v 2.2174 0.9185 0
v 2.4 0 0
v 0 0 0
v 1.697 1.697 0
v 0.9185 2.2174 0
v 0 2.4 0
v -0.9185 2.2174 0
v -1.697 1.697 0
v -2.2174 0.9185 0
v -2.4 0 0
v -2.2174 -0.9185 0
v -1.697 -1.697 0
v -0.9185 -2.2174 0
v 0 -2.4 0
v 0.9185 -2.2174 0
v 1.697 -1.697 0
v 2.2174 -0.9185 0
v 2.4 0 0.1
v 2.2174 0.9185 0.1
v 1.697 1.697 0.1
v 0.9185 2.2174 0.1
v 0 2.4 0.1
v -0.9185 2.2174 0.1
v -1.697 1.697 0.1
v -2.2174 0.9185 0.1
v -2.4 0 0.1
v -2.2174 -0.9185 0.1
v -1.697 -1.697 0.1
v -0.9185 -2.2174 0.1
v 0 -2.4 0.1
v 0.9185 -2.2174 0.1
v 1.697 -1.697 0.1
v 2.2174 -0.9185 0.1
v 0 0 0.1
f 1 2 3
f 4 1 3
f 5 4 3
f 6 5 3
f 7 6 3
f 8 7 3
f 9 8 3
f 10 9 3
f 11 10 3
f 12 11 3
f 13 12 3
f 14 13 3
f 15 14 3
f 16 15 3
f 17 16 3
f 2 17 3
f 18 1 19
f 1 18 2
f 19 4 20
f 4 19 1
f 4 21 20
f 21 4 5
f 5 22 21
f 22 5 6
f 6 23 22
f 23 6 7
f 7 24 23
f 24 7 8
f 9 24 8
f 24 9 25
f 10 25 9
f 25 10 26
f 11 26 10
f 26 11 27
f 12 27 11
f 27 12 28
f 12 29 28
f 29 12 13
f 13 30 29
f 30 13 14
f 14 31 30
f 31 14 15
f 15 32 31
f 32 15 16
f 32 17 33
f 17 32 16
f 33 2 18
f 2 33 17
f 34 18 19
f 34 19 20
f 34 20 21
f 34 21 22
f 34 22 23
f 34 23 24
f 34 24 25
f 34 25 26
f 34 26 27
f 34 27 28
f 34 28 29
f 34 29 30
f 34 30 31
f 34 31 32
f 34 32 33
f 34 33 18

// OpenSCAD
// file: ../p/4-4cyli.scad
use <../lib.scad>
function ldraw_lib__4_4cyli() = [
// 0 Cylinder 1.0
// 0 Name: 4-4cyli.dat
// 0 Author: James Jessiman
// 0 !LDRAW_ORG Primitive UPDATE 2005-01
// 0 !LICENSE Licensed under CC BY 4.0 : see CAreadme.txt
// 
// 0 BFC CERTIFY CCW
  [0,"BFC","CERTIFY"],
  [0,"BFC","CCW"],
// 
// 0 !HISTORY 1998-12-15 [PTadmin] Official Update 1998-10
// 0 !HISTORY 2002-03-23 [sbliss] Added BFC statement; merged headers from files in distributions LDraw 0.27 and Complete.
// 0 !HISTORY 2002-04-25 [PTadmin] Official Update 2002-02
// 0 !HISTORY 2004-12-14 [guyvivan] BFC CCW
// 0 !HISTORY 2005-12-28 [PTadmin] Official Update 2005-01
// 0 !HISTORY 2007-06-24 [PTadmin] Header formatted for Contributor Agreement
// 0 !HISTORY 2008-07-01 [PTadmin] Official Update 2008-01
// 
// 
// 4 16 1 1 0 0.9239 1 0.3827 0.9239 0 0.3827 1 0 0
  [4,16,1,1,0,0.9239,1,0.3827,0.9239,0,0.3827,1,0,0],
// 5 24 1 0 0 1 1 0 0.9239 0 0.3827 0.9239 0 -0.3827
  [5,24,1,0,0,1,1,0,0.9239,0,0.3827,0.9239,0,-0.3827],
// 4 16 0.9239 1 0.3827 0.7071 1 0.7071 0.7071 0 0.7071 0.9239 0 0.3827
  [4,16,0.9239,1,0.3827,0.7071,1,0.7071,0.7071,0,0.7071,0.9239,0,0.3827],
// 5 24 0.9239 0 0.3827 0.9239 1 0.3827 0.7071 0 0.7071 1 0 0
  [5,24,0.9239,0,0.3827,0.9239,1,0.3827,0.7071,0,0.7071,1,0,0],
// 4 16 0.7071 1 0.7071 0.3827 1 0.9239 0.3827 0 0.9239 0.7071 0 0.7071
  [4,16,0.7071,1,0.7071,0.3827,1,0.9239,0.3827,0,0.9239,0.7071,0,0.7071],
// 5 24 0.7071 0 0.7071 0.7071 1 0.7071 0.3827 0 0.9239 0.9239 0 0.3827
  [5,24,0.7071,0,0.7071,0.7071,1,0.7071,0.3827,0,0.9239,0.9239,0,0.3827],
// 4 16 0.3827 1 0.9239 0 1 1 0 0 1 0.3827 0 0.9239
  [4,16,0.3827,1,0.9239,0,1,1,0,0,1,0.3827,0,0.9239],
// 5 24 0.3827 0 0.9239 0.3827 1 0.9239 0 0 1 0.7071 0 0.7071
  [5,24,0.3827,0,0.9239,0.3827,1,0.9239,0,0,1,0.7071,0,0.7071],
// 4 16 0 1 1 -0.3827 1 0.9239 -0.3827 0 0.9239 0 0 1
  [4,16,0,1,1,-0.3827,1,0.9239,-0.3827,0,0.9239,0,0,1],
// 5 24 0 0 1 0 1 1 -0.3827 0 0.9239 0.3827 0 0.9239
  [5,24,0,0,1,0,1,1,-0.3827,0,0.9239,0.3827,0,0.9239],
// 4 16 -0.3827 1 0.9239 -0.7071 1 0.7071 -0.7071 0 0.7071 -0.3827 0 0.9239
  [4,16,-0.3827,1,0.9239,-0.7071,1,0.7071,-0.7071,0,0.7071,-0.3827,0,0.9239],
// 5 24 -0.3827 0 0.9239 -0.3827 1 0.9239 -0.7071 0 0.7071 0 0 1
  [5,24,-0.3827,0,0.9239,-0.3827,1,0.9239,-0.7071,0,0.7071,0,0,1],
// 4 16 -0.7071 1 0.7071 -0.9239 1 0.3827 -0.9239 0 0.3827 -0.7071 0 0.7071
  [4,16,-0.7071,1,0.7071,-0.9239,1,0.3827,-0.9239,0,0.3827,-0.7071,0,0.7071],
// 5 24 -0.7071 0 0.7071 -0.7071 1 0.7071 -0.9239 0 0.3827 -0.3827 0 0.9239
  [5,24,-0.7071,0,0.7071,-0.7071,1,0.7071,-0.9239,0,0.3827,-0.3827,0,0.9239],
// 4 16 -0.9239 1 0.3827 -1 1 0 -1 0 0 -0.9239 0 0.3827
  [4,16,-0.9239,1,0.3827,-1,1,0,-1,0,0,-0.9239,0,0.3827],
// 5 24 -0.9239 0 0.3827 -0.9239 1 0.3827 -1 0 0 -0.7071 0 0.7071
  [5,24,-0.9239,0,0.3827,-0.9239,1,0.3827,-1,0,0,-0.7071,0,0.7071],
// 4 16 -1 1 0 -0.9239 1 -0.3827 -0.9239 0 -0.3827 -1 0 0
  [4,16,-1,1,0,-0.9239,1,-0.3827,-0.9239,0,-0.3827,-1,0,0],
// 5 24 -1 0 0 -1 1 0 -0.9239 0 -0.3827 -0.9239 0 0.3827
  [5,24,-1,0,0,-1,1,0,-0.9239,0,-0.3827,-0.9239,0,0.3827],
// 4 16 -0.9239 1 -0.3827 -0.7071 1 -0.7071 -0.7071 0 -0.7071 -0.9239 0 -0.3827
  [4,16,-0.9239,1,-0.3827,-0.7071,1,-0.7071,-0.7071,0,-0.7071,-0.9239,0,-0.3827],
// 5 24 -0.9239 0 -0.3827 -0.9239 1 -0.3827 -0.7071 0 -0.7071 -1 0 0
  [5,24,-0.9239,0,-0.3827,-0.9239,1,-0.3827,-0.7071,0,-0.7071,-1,0,0],
// 4 16 -0.7071 1 -0.7071 -0.3827 1 -0.9239 -0.3827 0 -0.9239 -0.7071 0 -0.7071
  [4,16,-0.7071,1,-0.7071,-0.3827,1,-0.9239,-0.3827,0,-0.9239,-0.7071,0,-0.7071],
// 5 24 -0.7071 0 -0.7071 -0.7071 1 -0.7071 -0.3827 0 -0.9239 -0.9239 0 -0.3827
  [5,24,-0.7071,0,-0.7071,-0.7071,1,-0.7071,-0.3827,0,-0.9239,-0.9239,0,-0.3827],
// 4 16 -0.3827 1 -0.9239 0 1 -1 0 0 -1 -0.3827 0 -0.9239
  [4,16,-0.3827,1,-0.9239,0,1,-1,0,0,-1,-0.3827,0,-0.9239],
// 5 24 -0.3827 0 -0.9239 -0.3827 1 -0.9239 0 0 -1 -0.7071 0 -0.7071
  [5,24,-0.3827,0,-0.9239,-0.3827,1,-0.9239,0,0,-1,-0.7071,0,-0.7071],
// 4 16 0 1 -1 0.3827 1 -0.9239 0.3827 0 -0.9239 0 0 -1
  [4,16,0,1,-1,0.3827,1,-0.9239,0.3827,0,-0.9239,0,0,-1],
// 5 24 0 0 -1 0 1 -1 0.3827 0 -0.9239 -0.3827 0 -0.9239
  [5,24,0,0,-1,0,1,-1,0.3827,0,-0.9239,-0.3827,0,-0.9239],
// 4 16 0.3827 1 -0.9239 0.7071 1 -0.7071 0.7071 0 -0.7071 0.3827 0 -0.9239
  [4,16,0.3827,1,-0.9239,0.7071,1,-0.7071,0.7071,0,-0.7071,0.3827,0,-0.9239],
// 5 24 0.3827 0 -0.9239 0.3827 1 -0.9239 0.7071 0 -0.7071 0 0 -1
  [5,24,0.3827,0,-0.9239,0.3827,1,-0.9239,0.7071,0,-0.7071,0,0,-1],
// 4 16 0.7071 1 -0.7071 0.9239 1 -0.3827 0.9239 0 -0.3827 0.7071 0 -0.7071
  [4,16,0.7071,1,-0.7071,0.9239,1,-0.3827,0.9239,0,-0.3827,0.7071,0,-0.7071],
// 5 24 0.7071 0 -0.7071 0.7071 1 -0.7071 0.9239 0 -0.3827 0.3827 0 -0.9239
  [5,24,0.7071,0,-0.7071,0.7071,1,-0.7071,0.9239,0,-0.3827,0.3827,0,-0.9239],
// 4 16 0.9239 1 -0.3827 1 1 0 1 0 0 0.9239 0 -0.3827
  [4,16,0.9239,1,-0.3827,1,1,0,1,0,0,0.9239,0,-0.3827],
// 5 24 0.9239 0 -0.3827 0.9239 1 -0.3827 1 0 0 0.7071 0 -0.7071
  [5,24,0.9239,0,-0.3827,0.9239,1,-0.3827,1,0,0,0.7071,0,-0.7071],
// 0
];
module ldraw_lib__4_4cyli(step=0, col=false, unit=2/5, alt=false, line=0.2, solid=!$preview)
    makepoly(ldraw_lib__4_4cyli(), step=step, col=col, unit=unit, alt=alt, line=line, solid=solid);
ldraw_lib__4_4cyli(line=0.2);
// file: ../p/4-4disc.scad
use <../lib.scad>
function ldraw_lib__4_4disc() = [
// 0 Disc 1.0
// 0 Name: 4-4disc.dat
// 0 Author: James Jessiman
// 0 !LDRAW_ORG Primitive UPDATE 2002-02
// 0 !LICENSE Licensed under CC BY 4.0 : see CAreadme.txt
// 
// 0 BFC CERTIFY CCW
  [0,"BFC","CERTIFY"],
  [0,"BFC","CCW"],
// 
// 0 !HISTORY 1998-12-15 [PTadmin] Official Update 1998-10
// 0 !HISTORY 2002-03-23 [sbliss] Added BFC statement
// 0 !HISTORY 2002-04-25 [PTadmin] Official Update 2002-02
// 0 !HISTORY 2007-06-24 [PTadmin] Header formatted for Contributor Agreement
// 0 !HISTORY 2008-07-01 [PTadmin] Official Update 2008-01
// 
// 
// 3 16 0 0 0 1 0 0 0.9239 0 0.3827
  [3,16,0,0,0,1,0,0,0.9239,0,0.3827],
// 3 16 0 0 0 0.9239 0 0.3827 0.7071 0 0.7071
  [3,16,0,0,0,0.9239,0,0.3827,0.7071,0,0.7071],
// 3 16 0 0 0 0.7071 0 0.7071 0.3827 0 0.9239
  [3,16,0,0,0,0.7071,0,0.7071,0.3827,0,0.9239],
// 3 16 0 0 0 0.3827 0 0.9239 0 0 1
  [3,16,0,0,0,0.3827,0,0.9239,0,0,1],
// 3 16 0 0 0 0 0 1 -0.3827 0 0.9239
  [3,16,0,0,0,0,0,1,-0.3827,0,0.9239],
// 3 16 0 0 0 -0.3827 0 0.9239 -0.7071 0 0.7071
  [3,16,0,0,0,-0.3827,0,0.9239,-0.7071,0,0.7071],
// 3 16 0 0 0 -0.7071 0 0.7071 -0.9239 0 0.3827
  [3,16,0,0,0,-0.7071,0,0.7071,-0.9239,0,0.3827],
// 3 16 0 0 0 -0.9239 0 0.3827 -1 0 -0
  [3,16,0,0,0,-0.9239,0,0.3827,-1,0,-0],
// 3 16 0 0 0 -1 0 -0 -0.9239 0 -0.3827
  [3,16,0,0,0,-1,0,-0,-0.9239,0,-0.3827],
// 3 16 0 0 0 -0.9239 0 -0.3827 -0.7071 0 -0.7071
  [3,16,0,0,0,-0.9239,0,-0.3827,-0.7071,0,-0.7071],
// 3 16 0 0 0 -0.7071 0 -0.7071 -0.3827 0 -0.9239
  [3,16,0,0,0,-0.7071,0,-0.7071,-0.3827,0,-0.9239],
// 3 16 0 0 0 -0.3827 0 -0.9239 0 0 -1
  [3,16,0,0,0,-0.3827,0,-0.9239,0,0,-1],
// 3 16 0 0 0 0 0 -1 0.3827 0 -0.9239
  [3,16,0,0,0,0,0,-1,0.3827,0,-0.9239],
// 3 16 0 0 0 0.3827 0 -0.9239 0.7071 0 -0.7071
  [3,16,0,0,0,0.3827,0,-0.9239,0.7071,0,-0.7071],
// 3 16 0 0 0 0.7071 0 -0.7071 0.9239 0 -0.3827
  [3,16,0,0,0,0.7071,0,-0.7071,0.9239,0,-0.3827],
// 3 16 0 0 0 0.9239 0 -0.3827 1 0 0
  [3,16,0,0,0,0.9239,0,-0.3827,1,0,0],
// 0
];
module ldraw_lib__4_4disc(step=0, col=false, unit=2/5, alt=false, line=0.2, solid=!$preview)
    makepoly(ldraw_lib__4_4disc(), step=step, col=col, unit=unit, alt=alt, line=line, solid=solid);
ldraw_lib__4_4disc(line=0.2);
// file: ../p/4-4cylc3.scad
use <../lib.scad>
use <4-4cyli.scad>
use <4-4disc.scad>
function ldraw_lib__4_4cylc3() = [
// 0 Cylinder Closed 1.0 without Top or Bottom Edge Lines
// 0 Name: 4-4cylc3.dat
// 0 Author: Chris Dee [cwdee]
// 0 !LDRAW_ORG Primitive UPDATE 2017-01
// 0 !LICENSE Licensed under CC BY 4.0 : see CAreadme.txt
// 
// 0 BFC CERTIFY CCW
  [0,"BFC","CERTIFY"],
  [0,"BFC","CCW"],
// 
// 0 !HISTORY 2017-12-30 [PTadmin] Official Update 2017-01
// 
// 
// 1 16 0 0 0 1 0 0 0 1 0 0 0 1 4-4disc.dat
  [1,16,0,0,0,1,0,0,0,1,0,0,0,1, ldraw_lib__4_4disc()],
// 1 16 0 0 0 1 0 0 0 1 0 0 0 1 4-4cyli.dat
  [1,16,0,0,0,1,0,0,0,1,0,0,0,1, ldraw_lib__4_4cyli()],
// 0
];
module ldraw_lib__4_4cylc3(step=0, col=false, unit=2/5, alt=false, line=0.2, solid=!$preview)
    makepoly(ldraw_lib__4_4cylc3(), step=step, col=col, unit=unit, alt=alt, line=line, solid=solid);
ldraw_lib__4_4cylc3(line=0.2);
// main file
use <../lib.scad>
use <../p/4-4cylc3.scad>
use <../p/4-4disc.scad>
function ldraw_lib__003435c() = [
// 0 Sticker  0.6 x  0.6 Round with Black Background
// 0 Name: 003435c.dat
// 0 Author: J.C. Tchang [tchang]
// 0 !LDRAW_ORG Part UPDATE 2023-03
// 0 !LICENSE Licensed under CC BY 4.0 : see CAreadme.txt
// 
// 0 BFC CERTIFY CCW
  [0,"BFC","CERTIFY"],
  [0,"BFC","CCW"],
// 
// 0 !KEYWORDS Black Hole, Set 687-1
// 
// 0 !HISTORY 2023-06-24 [OrionP] Official Update 2023-03
// 
// 
// 1 16 0 0 0 6 0 0 0 -0.25 0 0 0 6 4-4cylc3.dat
  [1,16,0,0,0,6,0,0,0,-0.25,0,0,0,6, ldraw_lib__4_4cylc3()],
// 1 0 0 -0.25 0 6 0 0 0 1 0 0 0 6 4-4disc.dat
  [1,0,0,-0.25,0,6,0,0,0,1,0,0,0,6, ldraw_lib__4_4disc()],
];
module ldraw_lib__003435c(step=0, col=false, unit=2/5, alt=false, line=0.2, solid=!$preview)
    makepoly(ldraw_lib__003435c(), step=step, col=col, unit=unit, alt=alt, line=line, solid=solid);
ldraw_lib__003435c(line=0.2);
